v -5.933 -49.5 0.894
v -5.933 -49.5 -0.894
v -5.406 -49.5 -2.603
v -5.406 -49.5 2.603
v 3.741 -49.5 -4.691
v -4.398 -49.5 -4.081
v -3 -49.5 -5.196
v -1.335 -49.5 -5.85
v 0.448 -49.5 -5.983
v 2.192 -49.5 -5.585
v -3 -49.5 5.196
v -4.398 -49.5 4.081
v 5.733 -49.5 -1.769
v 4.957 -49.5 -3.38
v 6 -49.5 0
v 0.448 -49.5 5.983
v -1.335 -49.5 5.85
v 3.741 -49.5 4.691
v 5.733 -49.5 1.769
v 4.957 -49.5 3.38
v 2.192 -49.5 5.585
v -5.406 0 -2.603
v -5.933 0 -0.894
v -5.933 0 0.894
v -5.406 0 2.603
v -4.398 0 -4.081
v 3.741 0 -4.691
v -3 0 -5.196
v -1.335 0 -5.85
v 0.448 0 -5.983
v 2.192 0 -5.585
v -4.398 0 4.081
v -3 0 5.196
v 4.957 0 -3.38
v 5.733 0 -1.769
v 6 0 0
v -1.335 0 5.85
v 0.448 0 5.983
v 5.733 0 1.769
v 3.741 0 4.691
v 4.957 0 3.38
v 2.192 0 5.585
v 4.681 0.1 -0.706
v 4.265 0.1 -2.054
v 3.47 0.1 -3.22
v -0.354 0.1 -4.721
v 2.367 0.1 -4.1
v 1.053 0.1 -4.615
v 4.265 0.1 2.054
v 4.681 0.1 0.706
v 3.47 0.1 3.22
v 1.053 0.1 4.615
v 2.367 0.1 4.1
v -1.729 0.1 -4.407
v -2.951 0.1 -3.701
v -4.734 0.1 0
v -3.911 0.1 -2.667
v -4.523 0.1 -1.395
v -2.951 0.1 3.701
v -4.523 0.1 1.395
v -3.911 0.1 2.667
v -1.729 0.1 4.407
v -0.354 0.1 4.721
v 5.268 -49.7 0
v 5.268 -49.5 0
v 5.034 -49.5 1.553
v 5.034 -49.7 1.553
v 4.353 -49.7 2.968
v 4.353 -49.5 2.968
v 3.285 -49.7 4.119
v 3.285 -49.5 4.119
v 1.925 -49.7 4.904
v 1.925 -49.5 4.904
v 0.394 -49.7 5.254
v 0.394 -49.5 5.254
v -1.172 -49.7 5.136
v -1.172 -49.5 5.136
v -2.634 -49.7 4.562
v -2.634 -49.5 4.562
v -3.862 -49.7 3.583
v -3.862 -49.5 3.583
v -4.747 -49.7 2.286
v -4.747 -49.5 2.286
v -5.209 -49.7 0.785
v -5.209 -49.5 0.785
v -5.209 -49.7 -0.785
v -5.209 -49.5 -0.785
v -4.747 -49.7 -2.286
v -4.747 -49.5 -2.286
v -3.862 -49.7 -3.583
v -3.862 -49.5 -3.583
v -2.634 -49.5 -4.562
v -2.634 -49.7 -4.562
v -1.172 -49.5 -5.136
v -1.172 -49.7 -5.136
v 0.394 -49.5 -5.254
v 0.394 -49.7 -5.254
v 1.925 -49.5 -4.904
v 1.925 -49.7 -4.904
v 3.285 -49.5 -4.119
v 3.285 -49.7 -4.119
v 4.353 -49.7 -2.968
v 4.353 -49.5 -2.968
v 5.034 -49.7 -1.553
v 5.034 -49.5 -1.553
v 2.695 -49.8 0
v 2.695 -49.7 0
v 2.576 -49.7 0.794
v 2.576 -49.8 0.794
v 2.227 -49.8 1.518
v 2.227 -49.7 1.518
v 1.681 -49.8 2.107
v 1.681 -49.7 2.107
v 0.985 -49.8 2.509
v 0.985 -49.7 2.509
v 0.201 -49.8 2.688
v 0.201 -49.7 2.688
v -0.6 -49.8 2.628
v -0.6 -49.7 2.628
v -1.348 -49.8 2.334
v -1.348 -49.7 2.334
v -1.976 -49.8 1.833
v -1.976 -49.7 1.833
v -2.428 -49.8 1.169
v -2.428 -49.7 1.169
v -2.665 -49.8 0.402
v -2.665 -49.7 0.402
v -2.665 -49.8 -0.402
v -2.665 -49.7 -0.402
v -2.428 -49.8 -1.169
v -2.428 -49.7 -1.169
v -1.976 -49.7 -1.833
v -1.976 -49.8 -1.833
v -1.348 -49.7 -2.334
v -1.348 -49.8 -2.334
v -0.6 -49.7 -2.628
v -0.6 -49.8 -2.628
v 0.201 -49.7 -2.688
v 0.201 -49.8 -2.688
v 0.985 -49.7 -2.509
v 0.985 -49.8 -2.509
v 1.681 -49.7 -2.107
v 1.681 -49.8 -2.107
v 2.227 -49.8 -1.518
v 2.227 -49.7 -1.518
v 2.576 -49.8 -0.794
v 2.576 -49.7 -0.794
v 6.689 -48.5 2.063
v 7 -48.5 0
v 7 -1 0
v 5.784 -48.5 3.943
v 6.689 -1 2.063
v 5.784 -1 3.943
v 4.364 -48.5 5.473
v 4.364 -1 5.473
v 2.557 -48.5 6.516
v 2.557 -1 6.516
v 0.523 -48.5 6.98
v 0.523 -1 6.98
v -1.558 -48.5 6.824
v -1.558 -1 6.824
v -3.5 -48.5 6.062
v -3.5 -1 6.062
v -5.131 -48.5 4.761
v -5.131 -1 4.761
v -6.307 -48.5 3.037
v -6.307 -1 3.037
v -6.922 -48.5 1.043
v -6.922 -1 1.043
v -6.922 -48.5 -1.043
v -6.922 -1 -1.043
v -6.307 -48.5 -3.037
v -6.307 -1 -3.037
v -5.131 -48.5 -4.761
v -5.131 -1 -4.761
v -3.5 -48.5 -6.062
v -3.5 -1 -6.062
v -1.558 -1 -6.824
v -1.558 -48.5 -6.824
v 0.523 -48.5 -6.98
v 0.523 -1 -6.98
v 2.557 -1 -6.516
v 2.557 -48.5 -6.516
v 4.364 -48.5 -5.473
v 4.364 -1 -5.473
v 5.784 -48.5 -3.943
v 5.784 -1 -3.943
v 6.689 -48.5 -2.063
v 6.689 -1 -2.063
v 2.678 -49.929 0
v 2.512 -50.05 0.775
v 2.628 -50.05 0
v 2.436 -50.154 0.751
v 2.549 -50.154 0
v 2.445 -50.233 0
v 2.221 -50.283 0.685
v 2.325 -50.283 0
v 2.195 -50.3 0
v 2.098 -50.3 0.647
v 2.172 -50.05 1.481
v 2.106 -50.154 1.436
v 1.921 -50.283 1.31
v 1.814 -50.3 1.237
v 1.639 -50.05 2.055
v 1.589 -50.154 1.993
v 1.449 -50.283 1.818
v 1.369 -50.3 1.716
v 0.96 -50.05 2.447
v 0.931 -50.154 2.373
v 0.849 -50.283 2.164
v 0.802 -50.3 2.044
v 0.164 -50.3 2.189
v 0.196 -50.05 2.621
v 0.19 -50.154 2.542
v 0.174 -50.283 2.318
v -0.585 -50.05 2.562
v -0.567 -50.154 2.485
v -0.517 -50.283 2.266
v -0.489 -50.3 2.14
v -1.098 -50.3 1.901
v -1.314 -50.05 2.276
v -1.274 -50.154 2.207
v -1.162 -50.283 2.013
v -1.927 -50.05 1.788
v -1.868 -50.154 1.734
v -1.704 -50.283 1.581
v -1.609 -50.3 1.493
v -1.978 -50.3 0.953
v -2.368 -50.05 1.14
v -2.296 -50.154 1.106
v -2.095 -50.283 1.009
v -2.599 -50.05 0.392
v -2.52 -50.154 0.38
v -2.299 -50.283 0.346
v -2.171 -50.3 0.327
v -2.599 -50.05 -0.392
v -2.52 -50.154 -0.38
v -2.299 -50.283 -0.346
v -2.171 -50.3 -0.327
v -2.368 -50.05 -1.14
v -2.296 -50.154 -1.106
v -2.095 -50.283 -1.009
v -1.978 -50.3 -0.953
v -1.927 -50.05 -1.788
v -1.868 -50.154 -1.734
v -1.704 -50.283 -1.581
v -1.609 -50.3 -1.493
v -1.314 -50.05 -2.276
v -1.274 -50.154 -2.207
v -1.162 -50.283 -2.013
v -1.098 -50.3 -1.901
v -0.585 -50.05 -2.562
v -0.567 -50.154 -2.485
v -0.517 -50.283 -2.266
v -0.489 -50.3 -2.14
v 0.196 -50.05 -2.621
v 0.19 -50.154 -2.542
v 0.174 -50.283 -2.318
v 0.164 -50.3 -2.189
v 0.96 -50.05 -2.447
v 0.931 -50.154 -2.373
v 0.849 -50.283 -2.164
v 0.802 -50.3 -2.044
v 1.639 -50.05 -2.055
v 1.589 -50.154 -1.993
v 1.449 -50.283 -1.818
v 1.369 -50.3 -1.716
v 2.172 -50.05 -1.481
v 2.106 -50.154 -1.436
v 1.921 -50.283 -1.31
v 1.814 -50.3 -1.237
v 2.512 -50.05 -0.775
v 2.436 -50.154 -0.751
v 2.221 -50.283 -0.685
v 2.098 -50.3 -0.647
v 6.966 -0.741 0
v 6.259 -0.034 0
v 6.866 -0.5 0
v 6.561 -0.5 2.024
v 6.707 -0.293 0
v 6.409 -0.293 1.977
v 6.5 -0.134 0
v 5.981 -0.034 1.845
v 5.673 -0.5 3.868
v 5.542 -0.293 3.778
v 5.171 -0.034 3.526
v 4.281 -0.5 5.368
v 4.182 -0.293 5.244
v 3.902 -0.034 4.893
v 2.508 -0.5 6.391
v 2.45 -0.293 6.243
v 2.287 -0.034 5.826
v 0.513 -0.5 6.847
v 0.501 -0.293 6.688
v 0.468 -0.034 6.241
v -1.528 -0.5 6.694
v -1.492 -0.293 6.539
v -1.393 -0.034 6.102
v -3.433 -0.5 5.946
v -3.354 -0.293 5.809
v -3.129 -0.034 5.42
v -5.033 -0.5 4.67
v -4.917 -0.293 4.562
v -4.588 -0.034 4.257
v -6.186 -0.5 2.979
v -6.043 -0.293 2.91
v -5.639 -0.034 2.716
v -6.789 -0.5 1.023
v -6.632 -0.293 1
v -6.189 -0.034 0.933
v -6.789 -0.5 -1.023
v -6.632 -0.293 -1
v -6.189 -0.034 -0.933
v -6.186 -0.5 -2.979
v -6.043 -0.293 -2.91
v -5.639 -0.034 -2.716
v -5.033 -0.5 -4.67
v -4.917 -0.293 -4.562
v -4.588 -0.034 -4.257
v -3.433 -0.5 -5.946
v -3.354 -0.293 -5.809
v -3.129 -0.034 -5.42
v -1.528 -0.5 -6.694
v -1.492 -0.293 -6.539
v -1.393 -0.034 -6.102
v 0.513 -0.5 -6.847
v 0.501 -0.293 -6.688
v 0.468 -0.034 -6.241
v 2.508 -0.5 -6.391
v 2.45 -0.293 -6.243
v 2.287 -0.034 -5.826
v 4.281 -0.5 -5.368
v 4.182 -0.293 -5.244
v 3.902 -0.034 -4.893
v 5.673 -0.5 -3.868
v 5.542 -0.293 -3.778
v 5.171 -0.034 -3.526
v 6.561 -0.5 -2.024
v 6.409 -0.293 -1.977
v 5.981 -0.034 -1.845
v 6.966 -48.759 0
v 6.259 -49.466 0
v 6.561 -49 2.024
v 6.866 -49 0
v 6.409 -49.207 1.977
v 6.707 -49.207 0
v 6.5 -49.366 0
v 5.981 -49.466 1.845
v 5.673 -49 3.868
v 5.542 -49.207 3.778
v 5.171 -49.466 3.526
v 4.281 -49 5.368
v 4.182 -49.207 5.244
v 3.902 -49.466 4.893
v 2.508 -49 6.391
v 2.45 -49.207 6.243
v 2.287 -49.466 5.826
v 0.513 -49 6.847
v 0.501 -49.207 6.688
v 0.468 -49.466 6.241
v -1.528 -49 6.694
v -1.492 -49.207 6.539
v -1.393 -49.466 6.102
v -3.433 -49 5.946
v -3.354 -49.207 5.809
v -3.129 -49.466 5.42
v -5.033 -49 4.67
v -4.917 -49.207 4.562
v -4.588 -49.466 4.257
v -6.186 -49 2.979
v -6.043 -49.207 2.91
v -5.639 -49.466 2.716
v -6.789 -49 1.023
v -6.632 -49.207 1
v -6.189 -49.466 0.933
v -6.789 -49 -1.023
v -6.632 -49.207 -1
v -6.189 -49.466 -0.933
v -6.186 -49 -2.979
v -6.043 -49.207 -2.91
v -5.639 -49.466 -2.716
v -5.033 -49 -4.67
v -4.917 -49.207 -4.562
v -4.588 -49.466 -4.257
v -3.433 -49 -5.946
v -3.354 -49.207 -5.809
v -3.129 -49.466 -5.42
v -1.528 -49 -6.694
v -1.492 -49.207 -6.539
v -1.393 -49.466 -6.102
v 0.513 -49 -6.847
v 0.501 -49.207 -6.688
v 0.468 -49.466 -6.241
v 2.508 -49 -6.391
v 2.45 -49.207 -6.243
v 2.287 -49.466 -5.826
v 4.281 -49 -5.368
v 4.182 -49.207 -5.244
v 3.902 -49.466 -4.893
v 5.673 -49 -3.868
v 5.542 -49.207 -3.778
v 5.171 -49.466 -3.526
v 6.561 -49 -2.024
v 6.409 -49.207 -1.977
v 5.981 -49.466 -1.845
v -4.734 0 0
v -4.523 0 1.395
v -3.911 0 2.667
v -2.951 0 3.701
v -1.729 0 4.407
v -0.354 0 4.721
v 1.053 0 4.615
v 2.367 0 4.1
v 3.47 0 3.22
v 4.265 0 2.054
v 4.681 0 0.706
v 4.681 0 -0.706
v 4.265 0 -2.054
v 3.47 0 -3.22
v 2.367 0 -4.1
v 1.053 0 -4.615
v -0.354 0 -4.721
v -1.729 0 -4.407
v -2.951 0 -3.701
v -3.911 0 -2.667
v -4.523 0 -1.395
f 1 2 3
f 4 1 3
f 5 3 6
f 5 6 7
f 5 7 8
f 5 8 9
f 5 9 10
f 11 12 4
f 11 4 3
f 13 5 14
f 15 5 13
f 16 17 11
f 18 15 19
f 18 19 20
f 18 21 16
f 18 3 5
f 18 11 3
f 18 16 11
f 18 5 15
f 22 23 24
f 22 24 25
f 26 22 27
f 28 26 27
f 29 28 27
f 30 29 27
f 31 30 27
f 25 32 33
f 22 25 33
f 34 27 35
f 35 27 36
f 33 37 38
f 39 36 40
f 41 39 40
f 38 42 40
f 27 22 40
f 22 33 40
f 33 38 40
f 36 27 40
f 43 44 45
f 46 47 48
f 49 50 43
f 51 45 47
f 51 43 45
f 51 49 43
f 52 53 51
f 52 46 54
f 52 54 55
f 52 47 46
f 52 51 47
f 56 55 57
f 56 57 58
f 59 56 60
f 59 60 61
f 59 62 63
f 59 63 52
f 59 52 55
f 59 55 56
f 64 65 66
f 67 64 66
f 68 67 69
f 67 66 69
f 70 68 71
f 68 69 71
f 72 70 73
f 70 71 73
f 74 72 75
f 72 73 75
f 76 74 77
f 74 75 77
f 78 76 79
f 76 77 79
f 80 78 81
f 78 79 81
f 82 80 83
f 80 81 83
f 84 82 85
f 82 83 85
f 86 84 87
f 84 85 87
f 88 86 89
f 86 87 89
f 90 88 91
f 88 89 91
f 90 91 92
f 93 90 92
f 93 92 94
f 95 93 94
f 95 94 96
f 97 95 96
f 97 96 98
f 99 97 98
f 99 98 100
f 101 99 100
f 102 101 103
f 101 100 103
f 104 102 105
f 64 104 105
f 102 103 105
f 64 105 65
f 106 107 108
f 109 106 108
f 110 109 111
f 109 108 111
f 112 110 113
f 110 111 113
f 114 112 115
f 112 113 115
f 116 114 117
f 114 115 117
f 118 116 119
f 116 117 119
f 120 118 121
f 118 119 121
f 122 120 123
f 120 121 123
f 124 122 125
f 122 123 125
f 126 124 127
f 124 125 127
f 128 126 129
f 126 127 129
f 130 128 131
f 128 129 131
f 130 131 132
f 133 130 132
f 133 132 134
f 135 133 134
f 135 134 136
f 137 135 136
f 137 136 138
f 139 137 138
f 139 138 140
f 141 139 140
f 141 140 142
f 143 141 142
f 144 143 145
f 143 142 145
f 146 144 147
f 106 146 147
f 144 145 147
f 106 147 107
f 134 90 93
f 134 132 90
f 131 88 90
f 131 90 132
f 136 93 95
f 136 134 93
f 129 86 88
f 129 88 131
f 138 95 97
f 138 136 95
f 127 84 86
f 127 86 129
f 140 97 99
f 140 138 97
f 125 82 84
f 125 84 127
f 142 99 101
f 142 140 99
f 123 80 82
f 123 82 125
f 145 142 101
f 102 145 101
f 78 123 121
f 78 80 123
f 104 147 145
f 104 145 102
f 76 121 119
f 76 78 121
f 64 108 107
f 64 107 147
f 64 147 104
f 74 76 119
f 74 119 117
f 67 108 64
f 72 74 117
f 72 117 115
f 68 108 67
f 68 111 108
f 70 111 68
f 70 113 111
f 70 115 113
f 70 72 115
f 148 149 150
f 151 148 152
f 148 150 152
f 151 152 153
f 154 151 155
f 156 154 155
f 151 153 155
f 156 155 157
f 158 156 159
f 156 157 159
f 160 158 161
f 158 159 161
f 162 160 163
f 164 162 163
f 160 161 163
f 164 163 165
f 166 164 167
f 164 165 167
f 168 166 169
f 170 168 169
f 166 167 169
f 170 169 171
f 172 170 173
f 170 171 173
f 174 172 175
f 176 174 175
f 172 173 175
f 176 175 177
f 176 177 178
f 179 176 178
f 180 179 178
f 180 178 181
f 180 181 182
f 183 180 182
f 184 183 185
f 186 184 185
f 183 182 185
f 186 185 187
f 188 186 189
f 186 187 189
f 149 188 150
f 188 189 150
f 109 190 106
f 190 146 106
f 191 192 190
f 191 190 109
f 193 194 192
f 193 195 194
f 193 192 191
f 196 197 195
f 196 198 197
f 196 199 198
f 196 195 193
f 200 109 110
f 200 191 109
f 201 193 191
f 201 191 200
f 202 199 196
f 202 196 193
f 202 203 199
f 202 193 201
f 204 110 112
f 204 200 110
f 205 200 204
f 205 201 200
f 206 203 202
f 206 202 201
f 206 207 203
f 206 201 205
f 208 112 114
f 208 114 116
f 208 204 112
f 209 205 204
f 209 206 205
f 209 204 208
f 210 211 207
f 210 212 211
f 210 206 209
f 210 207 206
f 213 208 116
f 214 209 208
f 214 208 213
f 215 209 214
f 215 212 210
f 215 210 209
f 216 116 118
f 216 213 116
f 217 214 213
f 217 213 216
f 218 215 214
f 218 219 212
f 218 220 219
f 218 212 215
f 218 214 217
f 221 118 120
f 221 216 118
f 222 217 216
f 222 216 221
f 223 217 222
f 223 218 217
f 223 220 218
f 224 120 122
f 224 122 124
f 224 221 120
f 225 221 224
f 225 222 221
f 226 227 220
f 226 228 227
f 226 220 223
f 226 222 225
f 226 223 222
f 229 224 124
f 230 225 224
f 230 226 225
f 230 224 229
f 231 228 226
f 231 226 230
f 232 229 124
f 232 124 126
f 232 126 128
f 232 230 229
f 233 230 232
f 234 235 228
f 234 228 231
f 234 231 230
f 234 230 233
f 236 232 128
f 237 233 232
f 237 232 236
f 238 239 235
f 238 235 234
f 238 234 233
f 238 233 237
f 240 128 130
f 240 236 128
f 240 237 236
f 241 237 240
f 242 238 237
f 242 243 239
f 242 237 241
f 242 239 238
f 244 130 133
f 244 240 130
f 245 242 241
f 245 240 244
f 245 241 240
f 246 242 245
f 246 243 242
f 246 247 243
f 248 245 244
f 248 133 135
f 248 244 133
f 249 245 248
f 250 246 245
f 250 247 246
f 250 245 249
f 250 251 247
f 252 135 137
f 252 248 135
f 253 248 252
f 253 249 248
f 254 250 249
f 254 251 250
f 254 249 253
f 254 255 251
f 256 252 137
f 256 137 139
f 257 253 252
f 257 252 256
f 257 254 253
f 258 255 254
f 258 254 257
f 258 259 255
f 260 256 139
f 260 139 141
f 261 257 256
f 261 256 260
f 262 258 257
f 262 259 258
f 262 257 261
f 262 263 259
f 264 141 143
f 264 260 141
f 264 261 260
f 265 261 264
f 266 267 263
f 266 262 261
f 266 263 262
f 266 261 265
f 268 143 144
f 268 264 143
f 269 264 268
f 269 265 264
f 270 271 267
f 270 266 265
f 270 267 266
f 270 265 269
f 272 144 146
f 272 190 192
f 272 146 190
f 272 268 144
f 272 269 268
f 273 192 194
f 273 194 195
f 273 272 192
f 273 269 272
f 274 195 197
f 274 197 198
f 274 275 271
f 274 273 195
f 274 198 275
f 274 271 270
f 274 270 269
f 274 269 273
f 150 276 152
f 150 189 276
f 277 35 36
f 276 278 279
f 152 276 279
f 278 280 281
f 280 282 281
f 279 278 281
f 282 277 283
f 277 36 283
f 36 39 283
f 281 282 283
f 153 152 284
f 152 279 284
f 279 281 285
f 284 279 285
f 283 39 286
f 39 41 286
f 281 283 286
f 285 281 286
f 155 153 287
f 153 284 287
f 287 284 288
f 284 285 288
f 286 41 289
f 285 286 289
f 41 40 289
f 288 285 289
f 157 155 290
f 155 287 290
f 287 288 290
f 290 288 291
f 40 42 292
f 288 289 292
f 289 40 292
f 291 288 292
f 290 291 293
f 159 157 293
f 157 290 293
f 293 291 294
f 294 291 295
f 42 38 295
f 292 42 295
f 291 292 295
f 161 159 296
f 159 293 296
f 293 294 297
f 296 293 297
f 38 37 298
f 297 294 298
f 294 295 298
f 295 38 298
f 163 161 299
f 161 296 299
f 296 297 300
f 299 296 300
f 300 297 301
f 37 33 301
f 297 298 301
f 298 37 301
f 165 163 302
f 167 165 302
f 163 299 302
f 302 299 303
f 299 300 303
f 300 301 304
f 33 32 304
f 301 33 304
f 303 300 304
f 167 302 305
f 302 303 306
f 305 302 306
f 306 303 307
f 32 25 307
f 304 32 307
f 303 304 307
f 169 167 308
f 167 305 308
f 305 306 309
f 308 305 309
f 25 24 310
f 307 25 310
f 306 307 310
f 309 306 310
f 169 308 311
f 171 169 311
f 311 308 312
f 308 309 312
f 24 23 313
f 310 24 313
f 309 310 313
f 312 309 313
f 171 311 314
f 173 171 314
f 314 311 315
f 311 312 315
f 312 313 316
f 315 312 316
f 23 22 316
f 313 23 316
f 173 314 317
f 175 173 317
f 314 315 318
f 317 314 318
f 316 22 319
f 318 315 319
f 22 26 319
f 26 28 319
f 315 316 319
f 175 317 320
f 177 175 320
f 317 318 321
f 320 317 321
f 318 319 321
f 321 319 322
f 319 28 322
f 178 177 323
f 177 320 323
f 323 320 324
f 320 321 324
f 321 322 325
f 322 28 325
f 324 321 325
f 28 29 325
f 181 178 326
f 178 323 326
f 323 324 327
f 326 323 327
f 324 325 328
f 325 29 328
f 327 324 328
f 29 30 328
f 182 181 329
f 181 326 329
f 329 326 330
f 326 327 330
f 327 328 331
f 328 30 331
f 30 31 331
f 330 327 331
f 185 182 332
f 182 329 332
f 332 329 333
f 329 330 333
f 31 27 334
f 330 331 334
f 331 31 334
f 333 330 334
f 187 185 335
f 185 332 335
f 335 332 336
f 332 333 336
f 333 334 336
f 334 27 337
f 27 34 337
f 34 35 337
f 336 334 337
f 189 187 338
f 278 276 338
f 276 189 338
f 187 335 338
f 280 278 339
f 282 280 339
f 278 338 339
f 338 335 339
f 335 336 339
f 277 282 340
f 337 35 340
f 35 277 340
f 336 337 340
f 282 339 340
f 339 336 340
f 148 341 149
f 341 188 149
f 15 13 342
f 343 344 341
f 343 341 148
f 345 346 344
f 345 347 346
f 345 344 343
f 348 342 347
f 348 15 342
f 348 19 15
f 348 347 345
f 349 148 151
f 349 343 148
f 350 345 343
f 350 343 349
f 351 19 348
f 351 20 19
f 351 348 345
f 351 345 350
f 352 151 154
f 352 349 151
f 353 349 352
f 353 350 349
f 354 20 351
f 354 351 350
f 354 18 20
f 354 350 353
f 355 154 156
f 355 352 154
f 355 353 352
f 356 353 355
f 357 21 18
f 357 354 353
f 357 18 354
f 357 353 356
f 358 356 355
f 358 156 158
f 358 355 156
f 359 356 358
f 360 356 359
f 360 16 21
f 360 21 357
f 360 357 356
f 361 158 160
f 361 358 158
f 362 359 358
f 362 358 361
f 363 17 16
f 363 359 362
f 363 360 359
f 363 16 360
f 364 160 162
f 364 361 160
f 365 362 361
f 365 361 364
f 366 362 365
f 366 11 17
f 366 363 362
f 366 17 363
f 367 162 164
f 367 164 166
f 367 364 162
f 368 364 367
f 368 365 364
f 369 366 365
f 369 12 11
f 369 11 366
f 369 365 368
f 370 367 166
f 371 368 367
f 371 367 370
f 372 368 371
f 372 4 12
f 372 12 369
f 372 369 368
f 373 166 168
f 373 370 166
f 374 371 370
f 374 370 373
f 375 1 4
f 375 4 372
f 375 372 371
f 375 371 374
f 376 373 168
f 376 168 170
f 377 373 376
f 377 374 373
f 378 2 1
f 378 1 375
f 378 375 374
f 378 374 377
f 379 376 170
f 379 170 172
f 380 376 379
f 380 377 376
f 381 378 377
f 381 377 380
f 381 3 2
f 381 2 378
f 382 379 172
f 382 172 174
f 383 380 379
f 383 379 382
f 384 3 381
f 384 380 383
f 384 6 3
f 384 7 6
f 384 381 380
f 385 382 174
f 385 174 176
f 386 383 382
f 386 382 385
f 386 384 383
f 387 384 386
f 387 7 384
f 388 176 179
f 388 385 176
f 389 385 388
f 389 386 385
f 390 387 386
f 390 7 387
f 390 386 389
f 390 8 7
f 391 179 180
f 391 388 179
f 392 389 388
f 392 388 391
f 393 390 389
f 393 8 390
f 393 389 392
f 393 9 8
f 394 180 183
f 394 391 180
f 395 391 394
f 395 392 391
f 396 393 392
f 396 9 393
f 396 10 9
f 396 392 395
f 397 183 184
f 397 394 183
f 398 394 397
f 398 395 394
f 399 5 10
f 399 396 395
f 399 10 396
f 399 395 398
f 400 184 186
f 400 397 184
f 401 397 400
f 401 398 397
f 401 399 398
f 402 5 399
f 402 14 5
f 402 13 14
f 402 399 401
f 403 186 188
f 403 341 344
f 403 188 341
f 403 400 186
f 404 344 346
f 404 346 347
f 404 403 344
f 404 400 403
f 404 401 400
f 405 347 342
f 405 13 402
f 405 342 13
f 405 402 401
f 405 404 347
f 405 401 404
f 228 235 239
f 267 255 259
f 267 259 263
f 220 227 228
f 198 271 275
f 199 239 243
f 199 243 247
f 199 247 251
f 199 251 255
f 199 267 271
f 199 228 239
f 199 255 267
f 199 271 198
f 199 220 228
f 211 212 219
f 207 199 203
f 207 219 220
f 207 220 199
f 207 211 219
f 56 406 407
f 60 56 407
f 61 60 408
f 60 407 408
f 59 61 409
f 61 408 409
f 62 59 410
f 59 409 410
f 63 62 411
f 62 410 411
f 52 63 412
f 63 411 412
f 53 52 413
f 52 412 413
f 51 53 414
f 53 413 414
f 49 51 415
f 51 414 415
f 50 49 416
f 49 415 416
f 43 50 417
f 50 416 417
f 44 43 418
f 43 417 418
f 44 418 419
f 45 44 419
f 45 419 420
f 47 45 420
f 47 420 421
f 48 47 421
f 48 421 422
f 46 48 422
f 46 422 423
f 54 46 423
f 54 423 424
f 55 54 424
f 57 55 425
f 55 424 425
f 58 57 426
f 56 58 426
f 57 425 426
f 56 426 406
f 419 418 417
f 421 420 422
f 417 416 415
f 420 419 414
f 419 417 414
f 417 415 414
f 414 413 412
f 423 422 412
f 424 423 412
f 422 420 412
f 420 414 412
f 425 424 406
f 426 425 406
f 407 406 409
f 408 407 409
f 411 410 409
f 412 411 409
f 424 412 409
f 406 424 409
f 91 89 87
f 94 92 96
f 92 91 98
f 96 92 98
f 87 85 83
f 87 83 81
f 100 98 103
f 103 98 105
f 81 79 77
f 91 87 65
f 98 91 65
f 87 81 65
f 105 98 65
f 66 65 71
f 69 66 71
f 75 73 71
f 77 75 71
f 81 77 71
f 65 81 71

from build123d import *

# Parameters (mm, degrees)
F0_R     = 7
F1_DEPTH = 49.5
F2_R     = 5.26825
F3_DEPTH = 0.2
F4_R     = 1
F5_R     = 2.695351
F6_DEPTH = 0.6
F7_R     = 0.5
F8_R     = 4.733808
F9_DEPTH = 0.1


with BuildPart() as f1:
    # F0 (on Front) → F1 (new body)
    with BuildSketch(Plane.XZ):
        Circle(F0_R)
    extrude(amount=F1_DEPTH)

    # F4
    f4_edges = [f1.edges().sort_by_distance(p)[0] for p in [
        (-7, -49.5, 0),
        (-7, 0, 0),
    ]]
    fillet(f4_edges, radius=F4_R)


with BuildPart() as f3:
    # F2 (on face) → F3 (new body)
    with BuildSketch(Plane.XZ.offset(49.5)):
        Circle(F2_R)
    extrude(amount=F3_DEPTH)

    # F5 (on face) → F6 (join)
    with BuildSketch(Plane.XZ.offset(49.7)):
        Circle(F5_R)
    extrude(amount=F6_DEPTH)

    # F7
    f7_edges = [f3.edges().sort_by_distance(p)[0] for p in [
        (-2.695351, -50.3, 0),
    ]]
    fillet(f7_edges, radius=F7_R)


with BuildPart() as f9:
    # F8 (on face) → F9 (new body)
    with BuildSketch(Plane(origin=(0, 0, 0), x_dir=(-1, 0, 0), z_dir=(0, 1, 0))):
        Circle(F8_R)
    extrude(amount=F9_DEPTH)


solid = Compound([f1.part, f3.part, f9.part])
